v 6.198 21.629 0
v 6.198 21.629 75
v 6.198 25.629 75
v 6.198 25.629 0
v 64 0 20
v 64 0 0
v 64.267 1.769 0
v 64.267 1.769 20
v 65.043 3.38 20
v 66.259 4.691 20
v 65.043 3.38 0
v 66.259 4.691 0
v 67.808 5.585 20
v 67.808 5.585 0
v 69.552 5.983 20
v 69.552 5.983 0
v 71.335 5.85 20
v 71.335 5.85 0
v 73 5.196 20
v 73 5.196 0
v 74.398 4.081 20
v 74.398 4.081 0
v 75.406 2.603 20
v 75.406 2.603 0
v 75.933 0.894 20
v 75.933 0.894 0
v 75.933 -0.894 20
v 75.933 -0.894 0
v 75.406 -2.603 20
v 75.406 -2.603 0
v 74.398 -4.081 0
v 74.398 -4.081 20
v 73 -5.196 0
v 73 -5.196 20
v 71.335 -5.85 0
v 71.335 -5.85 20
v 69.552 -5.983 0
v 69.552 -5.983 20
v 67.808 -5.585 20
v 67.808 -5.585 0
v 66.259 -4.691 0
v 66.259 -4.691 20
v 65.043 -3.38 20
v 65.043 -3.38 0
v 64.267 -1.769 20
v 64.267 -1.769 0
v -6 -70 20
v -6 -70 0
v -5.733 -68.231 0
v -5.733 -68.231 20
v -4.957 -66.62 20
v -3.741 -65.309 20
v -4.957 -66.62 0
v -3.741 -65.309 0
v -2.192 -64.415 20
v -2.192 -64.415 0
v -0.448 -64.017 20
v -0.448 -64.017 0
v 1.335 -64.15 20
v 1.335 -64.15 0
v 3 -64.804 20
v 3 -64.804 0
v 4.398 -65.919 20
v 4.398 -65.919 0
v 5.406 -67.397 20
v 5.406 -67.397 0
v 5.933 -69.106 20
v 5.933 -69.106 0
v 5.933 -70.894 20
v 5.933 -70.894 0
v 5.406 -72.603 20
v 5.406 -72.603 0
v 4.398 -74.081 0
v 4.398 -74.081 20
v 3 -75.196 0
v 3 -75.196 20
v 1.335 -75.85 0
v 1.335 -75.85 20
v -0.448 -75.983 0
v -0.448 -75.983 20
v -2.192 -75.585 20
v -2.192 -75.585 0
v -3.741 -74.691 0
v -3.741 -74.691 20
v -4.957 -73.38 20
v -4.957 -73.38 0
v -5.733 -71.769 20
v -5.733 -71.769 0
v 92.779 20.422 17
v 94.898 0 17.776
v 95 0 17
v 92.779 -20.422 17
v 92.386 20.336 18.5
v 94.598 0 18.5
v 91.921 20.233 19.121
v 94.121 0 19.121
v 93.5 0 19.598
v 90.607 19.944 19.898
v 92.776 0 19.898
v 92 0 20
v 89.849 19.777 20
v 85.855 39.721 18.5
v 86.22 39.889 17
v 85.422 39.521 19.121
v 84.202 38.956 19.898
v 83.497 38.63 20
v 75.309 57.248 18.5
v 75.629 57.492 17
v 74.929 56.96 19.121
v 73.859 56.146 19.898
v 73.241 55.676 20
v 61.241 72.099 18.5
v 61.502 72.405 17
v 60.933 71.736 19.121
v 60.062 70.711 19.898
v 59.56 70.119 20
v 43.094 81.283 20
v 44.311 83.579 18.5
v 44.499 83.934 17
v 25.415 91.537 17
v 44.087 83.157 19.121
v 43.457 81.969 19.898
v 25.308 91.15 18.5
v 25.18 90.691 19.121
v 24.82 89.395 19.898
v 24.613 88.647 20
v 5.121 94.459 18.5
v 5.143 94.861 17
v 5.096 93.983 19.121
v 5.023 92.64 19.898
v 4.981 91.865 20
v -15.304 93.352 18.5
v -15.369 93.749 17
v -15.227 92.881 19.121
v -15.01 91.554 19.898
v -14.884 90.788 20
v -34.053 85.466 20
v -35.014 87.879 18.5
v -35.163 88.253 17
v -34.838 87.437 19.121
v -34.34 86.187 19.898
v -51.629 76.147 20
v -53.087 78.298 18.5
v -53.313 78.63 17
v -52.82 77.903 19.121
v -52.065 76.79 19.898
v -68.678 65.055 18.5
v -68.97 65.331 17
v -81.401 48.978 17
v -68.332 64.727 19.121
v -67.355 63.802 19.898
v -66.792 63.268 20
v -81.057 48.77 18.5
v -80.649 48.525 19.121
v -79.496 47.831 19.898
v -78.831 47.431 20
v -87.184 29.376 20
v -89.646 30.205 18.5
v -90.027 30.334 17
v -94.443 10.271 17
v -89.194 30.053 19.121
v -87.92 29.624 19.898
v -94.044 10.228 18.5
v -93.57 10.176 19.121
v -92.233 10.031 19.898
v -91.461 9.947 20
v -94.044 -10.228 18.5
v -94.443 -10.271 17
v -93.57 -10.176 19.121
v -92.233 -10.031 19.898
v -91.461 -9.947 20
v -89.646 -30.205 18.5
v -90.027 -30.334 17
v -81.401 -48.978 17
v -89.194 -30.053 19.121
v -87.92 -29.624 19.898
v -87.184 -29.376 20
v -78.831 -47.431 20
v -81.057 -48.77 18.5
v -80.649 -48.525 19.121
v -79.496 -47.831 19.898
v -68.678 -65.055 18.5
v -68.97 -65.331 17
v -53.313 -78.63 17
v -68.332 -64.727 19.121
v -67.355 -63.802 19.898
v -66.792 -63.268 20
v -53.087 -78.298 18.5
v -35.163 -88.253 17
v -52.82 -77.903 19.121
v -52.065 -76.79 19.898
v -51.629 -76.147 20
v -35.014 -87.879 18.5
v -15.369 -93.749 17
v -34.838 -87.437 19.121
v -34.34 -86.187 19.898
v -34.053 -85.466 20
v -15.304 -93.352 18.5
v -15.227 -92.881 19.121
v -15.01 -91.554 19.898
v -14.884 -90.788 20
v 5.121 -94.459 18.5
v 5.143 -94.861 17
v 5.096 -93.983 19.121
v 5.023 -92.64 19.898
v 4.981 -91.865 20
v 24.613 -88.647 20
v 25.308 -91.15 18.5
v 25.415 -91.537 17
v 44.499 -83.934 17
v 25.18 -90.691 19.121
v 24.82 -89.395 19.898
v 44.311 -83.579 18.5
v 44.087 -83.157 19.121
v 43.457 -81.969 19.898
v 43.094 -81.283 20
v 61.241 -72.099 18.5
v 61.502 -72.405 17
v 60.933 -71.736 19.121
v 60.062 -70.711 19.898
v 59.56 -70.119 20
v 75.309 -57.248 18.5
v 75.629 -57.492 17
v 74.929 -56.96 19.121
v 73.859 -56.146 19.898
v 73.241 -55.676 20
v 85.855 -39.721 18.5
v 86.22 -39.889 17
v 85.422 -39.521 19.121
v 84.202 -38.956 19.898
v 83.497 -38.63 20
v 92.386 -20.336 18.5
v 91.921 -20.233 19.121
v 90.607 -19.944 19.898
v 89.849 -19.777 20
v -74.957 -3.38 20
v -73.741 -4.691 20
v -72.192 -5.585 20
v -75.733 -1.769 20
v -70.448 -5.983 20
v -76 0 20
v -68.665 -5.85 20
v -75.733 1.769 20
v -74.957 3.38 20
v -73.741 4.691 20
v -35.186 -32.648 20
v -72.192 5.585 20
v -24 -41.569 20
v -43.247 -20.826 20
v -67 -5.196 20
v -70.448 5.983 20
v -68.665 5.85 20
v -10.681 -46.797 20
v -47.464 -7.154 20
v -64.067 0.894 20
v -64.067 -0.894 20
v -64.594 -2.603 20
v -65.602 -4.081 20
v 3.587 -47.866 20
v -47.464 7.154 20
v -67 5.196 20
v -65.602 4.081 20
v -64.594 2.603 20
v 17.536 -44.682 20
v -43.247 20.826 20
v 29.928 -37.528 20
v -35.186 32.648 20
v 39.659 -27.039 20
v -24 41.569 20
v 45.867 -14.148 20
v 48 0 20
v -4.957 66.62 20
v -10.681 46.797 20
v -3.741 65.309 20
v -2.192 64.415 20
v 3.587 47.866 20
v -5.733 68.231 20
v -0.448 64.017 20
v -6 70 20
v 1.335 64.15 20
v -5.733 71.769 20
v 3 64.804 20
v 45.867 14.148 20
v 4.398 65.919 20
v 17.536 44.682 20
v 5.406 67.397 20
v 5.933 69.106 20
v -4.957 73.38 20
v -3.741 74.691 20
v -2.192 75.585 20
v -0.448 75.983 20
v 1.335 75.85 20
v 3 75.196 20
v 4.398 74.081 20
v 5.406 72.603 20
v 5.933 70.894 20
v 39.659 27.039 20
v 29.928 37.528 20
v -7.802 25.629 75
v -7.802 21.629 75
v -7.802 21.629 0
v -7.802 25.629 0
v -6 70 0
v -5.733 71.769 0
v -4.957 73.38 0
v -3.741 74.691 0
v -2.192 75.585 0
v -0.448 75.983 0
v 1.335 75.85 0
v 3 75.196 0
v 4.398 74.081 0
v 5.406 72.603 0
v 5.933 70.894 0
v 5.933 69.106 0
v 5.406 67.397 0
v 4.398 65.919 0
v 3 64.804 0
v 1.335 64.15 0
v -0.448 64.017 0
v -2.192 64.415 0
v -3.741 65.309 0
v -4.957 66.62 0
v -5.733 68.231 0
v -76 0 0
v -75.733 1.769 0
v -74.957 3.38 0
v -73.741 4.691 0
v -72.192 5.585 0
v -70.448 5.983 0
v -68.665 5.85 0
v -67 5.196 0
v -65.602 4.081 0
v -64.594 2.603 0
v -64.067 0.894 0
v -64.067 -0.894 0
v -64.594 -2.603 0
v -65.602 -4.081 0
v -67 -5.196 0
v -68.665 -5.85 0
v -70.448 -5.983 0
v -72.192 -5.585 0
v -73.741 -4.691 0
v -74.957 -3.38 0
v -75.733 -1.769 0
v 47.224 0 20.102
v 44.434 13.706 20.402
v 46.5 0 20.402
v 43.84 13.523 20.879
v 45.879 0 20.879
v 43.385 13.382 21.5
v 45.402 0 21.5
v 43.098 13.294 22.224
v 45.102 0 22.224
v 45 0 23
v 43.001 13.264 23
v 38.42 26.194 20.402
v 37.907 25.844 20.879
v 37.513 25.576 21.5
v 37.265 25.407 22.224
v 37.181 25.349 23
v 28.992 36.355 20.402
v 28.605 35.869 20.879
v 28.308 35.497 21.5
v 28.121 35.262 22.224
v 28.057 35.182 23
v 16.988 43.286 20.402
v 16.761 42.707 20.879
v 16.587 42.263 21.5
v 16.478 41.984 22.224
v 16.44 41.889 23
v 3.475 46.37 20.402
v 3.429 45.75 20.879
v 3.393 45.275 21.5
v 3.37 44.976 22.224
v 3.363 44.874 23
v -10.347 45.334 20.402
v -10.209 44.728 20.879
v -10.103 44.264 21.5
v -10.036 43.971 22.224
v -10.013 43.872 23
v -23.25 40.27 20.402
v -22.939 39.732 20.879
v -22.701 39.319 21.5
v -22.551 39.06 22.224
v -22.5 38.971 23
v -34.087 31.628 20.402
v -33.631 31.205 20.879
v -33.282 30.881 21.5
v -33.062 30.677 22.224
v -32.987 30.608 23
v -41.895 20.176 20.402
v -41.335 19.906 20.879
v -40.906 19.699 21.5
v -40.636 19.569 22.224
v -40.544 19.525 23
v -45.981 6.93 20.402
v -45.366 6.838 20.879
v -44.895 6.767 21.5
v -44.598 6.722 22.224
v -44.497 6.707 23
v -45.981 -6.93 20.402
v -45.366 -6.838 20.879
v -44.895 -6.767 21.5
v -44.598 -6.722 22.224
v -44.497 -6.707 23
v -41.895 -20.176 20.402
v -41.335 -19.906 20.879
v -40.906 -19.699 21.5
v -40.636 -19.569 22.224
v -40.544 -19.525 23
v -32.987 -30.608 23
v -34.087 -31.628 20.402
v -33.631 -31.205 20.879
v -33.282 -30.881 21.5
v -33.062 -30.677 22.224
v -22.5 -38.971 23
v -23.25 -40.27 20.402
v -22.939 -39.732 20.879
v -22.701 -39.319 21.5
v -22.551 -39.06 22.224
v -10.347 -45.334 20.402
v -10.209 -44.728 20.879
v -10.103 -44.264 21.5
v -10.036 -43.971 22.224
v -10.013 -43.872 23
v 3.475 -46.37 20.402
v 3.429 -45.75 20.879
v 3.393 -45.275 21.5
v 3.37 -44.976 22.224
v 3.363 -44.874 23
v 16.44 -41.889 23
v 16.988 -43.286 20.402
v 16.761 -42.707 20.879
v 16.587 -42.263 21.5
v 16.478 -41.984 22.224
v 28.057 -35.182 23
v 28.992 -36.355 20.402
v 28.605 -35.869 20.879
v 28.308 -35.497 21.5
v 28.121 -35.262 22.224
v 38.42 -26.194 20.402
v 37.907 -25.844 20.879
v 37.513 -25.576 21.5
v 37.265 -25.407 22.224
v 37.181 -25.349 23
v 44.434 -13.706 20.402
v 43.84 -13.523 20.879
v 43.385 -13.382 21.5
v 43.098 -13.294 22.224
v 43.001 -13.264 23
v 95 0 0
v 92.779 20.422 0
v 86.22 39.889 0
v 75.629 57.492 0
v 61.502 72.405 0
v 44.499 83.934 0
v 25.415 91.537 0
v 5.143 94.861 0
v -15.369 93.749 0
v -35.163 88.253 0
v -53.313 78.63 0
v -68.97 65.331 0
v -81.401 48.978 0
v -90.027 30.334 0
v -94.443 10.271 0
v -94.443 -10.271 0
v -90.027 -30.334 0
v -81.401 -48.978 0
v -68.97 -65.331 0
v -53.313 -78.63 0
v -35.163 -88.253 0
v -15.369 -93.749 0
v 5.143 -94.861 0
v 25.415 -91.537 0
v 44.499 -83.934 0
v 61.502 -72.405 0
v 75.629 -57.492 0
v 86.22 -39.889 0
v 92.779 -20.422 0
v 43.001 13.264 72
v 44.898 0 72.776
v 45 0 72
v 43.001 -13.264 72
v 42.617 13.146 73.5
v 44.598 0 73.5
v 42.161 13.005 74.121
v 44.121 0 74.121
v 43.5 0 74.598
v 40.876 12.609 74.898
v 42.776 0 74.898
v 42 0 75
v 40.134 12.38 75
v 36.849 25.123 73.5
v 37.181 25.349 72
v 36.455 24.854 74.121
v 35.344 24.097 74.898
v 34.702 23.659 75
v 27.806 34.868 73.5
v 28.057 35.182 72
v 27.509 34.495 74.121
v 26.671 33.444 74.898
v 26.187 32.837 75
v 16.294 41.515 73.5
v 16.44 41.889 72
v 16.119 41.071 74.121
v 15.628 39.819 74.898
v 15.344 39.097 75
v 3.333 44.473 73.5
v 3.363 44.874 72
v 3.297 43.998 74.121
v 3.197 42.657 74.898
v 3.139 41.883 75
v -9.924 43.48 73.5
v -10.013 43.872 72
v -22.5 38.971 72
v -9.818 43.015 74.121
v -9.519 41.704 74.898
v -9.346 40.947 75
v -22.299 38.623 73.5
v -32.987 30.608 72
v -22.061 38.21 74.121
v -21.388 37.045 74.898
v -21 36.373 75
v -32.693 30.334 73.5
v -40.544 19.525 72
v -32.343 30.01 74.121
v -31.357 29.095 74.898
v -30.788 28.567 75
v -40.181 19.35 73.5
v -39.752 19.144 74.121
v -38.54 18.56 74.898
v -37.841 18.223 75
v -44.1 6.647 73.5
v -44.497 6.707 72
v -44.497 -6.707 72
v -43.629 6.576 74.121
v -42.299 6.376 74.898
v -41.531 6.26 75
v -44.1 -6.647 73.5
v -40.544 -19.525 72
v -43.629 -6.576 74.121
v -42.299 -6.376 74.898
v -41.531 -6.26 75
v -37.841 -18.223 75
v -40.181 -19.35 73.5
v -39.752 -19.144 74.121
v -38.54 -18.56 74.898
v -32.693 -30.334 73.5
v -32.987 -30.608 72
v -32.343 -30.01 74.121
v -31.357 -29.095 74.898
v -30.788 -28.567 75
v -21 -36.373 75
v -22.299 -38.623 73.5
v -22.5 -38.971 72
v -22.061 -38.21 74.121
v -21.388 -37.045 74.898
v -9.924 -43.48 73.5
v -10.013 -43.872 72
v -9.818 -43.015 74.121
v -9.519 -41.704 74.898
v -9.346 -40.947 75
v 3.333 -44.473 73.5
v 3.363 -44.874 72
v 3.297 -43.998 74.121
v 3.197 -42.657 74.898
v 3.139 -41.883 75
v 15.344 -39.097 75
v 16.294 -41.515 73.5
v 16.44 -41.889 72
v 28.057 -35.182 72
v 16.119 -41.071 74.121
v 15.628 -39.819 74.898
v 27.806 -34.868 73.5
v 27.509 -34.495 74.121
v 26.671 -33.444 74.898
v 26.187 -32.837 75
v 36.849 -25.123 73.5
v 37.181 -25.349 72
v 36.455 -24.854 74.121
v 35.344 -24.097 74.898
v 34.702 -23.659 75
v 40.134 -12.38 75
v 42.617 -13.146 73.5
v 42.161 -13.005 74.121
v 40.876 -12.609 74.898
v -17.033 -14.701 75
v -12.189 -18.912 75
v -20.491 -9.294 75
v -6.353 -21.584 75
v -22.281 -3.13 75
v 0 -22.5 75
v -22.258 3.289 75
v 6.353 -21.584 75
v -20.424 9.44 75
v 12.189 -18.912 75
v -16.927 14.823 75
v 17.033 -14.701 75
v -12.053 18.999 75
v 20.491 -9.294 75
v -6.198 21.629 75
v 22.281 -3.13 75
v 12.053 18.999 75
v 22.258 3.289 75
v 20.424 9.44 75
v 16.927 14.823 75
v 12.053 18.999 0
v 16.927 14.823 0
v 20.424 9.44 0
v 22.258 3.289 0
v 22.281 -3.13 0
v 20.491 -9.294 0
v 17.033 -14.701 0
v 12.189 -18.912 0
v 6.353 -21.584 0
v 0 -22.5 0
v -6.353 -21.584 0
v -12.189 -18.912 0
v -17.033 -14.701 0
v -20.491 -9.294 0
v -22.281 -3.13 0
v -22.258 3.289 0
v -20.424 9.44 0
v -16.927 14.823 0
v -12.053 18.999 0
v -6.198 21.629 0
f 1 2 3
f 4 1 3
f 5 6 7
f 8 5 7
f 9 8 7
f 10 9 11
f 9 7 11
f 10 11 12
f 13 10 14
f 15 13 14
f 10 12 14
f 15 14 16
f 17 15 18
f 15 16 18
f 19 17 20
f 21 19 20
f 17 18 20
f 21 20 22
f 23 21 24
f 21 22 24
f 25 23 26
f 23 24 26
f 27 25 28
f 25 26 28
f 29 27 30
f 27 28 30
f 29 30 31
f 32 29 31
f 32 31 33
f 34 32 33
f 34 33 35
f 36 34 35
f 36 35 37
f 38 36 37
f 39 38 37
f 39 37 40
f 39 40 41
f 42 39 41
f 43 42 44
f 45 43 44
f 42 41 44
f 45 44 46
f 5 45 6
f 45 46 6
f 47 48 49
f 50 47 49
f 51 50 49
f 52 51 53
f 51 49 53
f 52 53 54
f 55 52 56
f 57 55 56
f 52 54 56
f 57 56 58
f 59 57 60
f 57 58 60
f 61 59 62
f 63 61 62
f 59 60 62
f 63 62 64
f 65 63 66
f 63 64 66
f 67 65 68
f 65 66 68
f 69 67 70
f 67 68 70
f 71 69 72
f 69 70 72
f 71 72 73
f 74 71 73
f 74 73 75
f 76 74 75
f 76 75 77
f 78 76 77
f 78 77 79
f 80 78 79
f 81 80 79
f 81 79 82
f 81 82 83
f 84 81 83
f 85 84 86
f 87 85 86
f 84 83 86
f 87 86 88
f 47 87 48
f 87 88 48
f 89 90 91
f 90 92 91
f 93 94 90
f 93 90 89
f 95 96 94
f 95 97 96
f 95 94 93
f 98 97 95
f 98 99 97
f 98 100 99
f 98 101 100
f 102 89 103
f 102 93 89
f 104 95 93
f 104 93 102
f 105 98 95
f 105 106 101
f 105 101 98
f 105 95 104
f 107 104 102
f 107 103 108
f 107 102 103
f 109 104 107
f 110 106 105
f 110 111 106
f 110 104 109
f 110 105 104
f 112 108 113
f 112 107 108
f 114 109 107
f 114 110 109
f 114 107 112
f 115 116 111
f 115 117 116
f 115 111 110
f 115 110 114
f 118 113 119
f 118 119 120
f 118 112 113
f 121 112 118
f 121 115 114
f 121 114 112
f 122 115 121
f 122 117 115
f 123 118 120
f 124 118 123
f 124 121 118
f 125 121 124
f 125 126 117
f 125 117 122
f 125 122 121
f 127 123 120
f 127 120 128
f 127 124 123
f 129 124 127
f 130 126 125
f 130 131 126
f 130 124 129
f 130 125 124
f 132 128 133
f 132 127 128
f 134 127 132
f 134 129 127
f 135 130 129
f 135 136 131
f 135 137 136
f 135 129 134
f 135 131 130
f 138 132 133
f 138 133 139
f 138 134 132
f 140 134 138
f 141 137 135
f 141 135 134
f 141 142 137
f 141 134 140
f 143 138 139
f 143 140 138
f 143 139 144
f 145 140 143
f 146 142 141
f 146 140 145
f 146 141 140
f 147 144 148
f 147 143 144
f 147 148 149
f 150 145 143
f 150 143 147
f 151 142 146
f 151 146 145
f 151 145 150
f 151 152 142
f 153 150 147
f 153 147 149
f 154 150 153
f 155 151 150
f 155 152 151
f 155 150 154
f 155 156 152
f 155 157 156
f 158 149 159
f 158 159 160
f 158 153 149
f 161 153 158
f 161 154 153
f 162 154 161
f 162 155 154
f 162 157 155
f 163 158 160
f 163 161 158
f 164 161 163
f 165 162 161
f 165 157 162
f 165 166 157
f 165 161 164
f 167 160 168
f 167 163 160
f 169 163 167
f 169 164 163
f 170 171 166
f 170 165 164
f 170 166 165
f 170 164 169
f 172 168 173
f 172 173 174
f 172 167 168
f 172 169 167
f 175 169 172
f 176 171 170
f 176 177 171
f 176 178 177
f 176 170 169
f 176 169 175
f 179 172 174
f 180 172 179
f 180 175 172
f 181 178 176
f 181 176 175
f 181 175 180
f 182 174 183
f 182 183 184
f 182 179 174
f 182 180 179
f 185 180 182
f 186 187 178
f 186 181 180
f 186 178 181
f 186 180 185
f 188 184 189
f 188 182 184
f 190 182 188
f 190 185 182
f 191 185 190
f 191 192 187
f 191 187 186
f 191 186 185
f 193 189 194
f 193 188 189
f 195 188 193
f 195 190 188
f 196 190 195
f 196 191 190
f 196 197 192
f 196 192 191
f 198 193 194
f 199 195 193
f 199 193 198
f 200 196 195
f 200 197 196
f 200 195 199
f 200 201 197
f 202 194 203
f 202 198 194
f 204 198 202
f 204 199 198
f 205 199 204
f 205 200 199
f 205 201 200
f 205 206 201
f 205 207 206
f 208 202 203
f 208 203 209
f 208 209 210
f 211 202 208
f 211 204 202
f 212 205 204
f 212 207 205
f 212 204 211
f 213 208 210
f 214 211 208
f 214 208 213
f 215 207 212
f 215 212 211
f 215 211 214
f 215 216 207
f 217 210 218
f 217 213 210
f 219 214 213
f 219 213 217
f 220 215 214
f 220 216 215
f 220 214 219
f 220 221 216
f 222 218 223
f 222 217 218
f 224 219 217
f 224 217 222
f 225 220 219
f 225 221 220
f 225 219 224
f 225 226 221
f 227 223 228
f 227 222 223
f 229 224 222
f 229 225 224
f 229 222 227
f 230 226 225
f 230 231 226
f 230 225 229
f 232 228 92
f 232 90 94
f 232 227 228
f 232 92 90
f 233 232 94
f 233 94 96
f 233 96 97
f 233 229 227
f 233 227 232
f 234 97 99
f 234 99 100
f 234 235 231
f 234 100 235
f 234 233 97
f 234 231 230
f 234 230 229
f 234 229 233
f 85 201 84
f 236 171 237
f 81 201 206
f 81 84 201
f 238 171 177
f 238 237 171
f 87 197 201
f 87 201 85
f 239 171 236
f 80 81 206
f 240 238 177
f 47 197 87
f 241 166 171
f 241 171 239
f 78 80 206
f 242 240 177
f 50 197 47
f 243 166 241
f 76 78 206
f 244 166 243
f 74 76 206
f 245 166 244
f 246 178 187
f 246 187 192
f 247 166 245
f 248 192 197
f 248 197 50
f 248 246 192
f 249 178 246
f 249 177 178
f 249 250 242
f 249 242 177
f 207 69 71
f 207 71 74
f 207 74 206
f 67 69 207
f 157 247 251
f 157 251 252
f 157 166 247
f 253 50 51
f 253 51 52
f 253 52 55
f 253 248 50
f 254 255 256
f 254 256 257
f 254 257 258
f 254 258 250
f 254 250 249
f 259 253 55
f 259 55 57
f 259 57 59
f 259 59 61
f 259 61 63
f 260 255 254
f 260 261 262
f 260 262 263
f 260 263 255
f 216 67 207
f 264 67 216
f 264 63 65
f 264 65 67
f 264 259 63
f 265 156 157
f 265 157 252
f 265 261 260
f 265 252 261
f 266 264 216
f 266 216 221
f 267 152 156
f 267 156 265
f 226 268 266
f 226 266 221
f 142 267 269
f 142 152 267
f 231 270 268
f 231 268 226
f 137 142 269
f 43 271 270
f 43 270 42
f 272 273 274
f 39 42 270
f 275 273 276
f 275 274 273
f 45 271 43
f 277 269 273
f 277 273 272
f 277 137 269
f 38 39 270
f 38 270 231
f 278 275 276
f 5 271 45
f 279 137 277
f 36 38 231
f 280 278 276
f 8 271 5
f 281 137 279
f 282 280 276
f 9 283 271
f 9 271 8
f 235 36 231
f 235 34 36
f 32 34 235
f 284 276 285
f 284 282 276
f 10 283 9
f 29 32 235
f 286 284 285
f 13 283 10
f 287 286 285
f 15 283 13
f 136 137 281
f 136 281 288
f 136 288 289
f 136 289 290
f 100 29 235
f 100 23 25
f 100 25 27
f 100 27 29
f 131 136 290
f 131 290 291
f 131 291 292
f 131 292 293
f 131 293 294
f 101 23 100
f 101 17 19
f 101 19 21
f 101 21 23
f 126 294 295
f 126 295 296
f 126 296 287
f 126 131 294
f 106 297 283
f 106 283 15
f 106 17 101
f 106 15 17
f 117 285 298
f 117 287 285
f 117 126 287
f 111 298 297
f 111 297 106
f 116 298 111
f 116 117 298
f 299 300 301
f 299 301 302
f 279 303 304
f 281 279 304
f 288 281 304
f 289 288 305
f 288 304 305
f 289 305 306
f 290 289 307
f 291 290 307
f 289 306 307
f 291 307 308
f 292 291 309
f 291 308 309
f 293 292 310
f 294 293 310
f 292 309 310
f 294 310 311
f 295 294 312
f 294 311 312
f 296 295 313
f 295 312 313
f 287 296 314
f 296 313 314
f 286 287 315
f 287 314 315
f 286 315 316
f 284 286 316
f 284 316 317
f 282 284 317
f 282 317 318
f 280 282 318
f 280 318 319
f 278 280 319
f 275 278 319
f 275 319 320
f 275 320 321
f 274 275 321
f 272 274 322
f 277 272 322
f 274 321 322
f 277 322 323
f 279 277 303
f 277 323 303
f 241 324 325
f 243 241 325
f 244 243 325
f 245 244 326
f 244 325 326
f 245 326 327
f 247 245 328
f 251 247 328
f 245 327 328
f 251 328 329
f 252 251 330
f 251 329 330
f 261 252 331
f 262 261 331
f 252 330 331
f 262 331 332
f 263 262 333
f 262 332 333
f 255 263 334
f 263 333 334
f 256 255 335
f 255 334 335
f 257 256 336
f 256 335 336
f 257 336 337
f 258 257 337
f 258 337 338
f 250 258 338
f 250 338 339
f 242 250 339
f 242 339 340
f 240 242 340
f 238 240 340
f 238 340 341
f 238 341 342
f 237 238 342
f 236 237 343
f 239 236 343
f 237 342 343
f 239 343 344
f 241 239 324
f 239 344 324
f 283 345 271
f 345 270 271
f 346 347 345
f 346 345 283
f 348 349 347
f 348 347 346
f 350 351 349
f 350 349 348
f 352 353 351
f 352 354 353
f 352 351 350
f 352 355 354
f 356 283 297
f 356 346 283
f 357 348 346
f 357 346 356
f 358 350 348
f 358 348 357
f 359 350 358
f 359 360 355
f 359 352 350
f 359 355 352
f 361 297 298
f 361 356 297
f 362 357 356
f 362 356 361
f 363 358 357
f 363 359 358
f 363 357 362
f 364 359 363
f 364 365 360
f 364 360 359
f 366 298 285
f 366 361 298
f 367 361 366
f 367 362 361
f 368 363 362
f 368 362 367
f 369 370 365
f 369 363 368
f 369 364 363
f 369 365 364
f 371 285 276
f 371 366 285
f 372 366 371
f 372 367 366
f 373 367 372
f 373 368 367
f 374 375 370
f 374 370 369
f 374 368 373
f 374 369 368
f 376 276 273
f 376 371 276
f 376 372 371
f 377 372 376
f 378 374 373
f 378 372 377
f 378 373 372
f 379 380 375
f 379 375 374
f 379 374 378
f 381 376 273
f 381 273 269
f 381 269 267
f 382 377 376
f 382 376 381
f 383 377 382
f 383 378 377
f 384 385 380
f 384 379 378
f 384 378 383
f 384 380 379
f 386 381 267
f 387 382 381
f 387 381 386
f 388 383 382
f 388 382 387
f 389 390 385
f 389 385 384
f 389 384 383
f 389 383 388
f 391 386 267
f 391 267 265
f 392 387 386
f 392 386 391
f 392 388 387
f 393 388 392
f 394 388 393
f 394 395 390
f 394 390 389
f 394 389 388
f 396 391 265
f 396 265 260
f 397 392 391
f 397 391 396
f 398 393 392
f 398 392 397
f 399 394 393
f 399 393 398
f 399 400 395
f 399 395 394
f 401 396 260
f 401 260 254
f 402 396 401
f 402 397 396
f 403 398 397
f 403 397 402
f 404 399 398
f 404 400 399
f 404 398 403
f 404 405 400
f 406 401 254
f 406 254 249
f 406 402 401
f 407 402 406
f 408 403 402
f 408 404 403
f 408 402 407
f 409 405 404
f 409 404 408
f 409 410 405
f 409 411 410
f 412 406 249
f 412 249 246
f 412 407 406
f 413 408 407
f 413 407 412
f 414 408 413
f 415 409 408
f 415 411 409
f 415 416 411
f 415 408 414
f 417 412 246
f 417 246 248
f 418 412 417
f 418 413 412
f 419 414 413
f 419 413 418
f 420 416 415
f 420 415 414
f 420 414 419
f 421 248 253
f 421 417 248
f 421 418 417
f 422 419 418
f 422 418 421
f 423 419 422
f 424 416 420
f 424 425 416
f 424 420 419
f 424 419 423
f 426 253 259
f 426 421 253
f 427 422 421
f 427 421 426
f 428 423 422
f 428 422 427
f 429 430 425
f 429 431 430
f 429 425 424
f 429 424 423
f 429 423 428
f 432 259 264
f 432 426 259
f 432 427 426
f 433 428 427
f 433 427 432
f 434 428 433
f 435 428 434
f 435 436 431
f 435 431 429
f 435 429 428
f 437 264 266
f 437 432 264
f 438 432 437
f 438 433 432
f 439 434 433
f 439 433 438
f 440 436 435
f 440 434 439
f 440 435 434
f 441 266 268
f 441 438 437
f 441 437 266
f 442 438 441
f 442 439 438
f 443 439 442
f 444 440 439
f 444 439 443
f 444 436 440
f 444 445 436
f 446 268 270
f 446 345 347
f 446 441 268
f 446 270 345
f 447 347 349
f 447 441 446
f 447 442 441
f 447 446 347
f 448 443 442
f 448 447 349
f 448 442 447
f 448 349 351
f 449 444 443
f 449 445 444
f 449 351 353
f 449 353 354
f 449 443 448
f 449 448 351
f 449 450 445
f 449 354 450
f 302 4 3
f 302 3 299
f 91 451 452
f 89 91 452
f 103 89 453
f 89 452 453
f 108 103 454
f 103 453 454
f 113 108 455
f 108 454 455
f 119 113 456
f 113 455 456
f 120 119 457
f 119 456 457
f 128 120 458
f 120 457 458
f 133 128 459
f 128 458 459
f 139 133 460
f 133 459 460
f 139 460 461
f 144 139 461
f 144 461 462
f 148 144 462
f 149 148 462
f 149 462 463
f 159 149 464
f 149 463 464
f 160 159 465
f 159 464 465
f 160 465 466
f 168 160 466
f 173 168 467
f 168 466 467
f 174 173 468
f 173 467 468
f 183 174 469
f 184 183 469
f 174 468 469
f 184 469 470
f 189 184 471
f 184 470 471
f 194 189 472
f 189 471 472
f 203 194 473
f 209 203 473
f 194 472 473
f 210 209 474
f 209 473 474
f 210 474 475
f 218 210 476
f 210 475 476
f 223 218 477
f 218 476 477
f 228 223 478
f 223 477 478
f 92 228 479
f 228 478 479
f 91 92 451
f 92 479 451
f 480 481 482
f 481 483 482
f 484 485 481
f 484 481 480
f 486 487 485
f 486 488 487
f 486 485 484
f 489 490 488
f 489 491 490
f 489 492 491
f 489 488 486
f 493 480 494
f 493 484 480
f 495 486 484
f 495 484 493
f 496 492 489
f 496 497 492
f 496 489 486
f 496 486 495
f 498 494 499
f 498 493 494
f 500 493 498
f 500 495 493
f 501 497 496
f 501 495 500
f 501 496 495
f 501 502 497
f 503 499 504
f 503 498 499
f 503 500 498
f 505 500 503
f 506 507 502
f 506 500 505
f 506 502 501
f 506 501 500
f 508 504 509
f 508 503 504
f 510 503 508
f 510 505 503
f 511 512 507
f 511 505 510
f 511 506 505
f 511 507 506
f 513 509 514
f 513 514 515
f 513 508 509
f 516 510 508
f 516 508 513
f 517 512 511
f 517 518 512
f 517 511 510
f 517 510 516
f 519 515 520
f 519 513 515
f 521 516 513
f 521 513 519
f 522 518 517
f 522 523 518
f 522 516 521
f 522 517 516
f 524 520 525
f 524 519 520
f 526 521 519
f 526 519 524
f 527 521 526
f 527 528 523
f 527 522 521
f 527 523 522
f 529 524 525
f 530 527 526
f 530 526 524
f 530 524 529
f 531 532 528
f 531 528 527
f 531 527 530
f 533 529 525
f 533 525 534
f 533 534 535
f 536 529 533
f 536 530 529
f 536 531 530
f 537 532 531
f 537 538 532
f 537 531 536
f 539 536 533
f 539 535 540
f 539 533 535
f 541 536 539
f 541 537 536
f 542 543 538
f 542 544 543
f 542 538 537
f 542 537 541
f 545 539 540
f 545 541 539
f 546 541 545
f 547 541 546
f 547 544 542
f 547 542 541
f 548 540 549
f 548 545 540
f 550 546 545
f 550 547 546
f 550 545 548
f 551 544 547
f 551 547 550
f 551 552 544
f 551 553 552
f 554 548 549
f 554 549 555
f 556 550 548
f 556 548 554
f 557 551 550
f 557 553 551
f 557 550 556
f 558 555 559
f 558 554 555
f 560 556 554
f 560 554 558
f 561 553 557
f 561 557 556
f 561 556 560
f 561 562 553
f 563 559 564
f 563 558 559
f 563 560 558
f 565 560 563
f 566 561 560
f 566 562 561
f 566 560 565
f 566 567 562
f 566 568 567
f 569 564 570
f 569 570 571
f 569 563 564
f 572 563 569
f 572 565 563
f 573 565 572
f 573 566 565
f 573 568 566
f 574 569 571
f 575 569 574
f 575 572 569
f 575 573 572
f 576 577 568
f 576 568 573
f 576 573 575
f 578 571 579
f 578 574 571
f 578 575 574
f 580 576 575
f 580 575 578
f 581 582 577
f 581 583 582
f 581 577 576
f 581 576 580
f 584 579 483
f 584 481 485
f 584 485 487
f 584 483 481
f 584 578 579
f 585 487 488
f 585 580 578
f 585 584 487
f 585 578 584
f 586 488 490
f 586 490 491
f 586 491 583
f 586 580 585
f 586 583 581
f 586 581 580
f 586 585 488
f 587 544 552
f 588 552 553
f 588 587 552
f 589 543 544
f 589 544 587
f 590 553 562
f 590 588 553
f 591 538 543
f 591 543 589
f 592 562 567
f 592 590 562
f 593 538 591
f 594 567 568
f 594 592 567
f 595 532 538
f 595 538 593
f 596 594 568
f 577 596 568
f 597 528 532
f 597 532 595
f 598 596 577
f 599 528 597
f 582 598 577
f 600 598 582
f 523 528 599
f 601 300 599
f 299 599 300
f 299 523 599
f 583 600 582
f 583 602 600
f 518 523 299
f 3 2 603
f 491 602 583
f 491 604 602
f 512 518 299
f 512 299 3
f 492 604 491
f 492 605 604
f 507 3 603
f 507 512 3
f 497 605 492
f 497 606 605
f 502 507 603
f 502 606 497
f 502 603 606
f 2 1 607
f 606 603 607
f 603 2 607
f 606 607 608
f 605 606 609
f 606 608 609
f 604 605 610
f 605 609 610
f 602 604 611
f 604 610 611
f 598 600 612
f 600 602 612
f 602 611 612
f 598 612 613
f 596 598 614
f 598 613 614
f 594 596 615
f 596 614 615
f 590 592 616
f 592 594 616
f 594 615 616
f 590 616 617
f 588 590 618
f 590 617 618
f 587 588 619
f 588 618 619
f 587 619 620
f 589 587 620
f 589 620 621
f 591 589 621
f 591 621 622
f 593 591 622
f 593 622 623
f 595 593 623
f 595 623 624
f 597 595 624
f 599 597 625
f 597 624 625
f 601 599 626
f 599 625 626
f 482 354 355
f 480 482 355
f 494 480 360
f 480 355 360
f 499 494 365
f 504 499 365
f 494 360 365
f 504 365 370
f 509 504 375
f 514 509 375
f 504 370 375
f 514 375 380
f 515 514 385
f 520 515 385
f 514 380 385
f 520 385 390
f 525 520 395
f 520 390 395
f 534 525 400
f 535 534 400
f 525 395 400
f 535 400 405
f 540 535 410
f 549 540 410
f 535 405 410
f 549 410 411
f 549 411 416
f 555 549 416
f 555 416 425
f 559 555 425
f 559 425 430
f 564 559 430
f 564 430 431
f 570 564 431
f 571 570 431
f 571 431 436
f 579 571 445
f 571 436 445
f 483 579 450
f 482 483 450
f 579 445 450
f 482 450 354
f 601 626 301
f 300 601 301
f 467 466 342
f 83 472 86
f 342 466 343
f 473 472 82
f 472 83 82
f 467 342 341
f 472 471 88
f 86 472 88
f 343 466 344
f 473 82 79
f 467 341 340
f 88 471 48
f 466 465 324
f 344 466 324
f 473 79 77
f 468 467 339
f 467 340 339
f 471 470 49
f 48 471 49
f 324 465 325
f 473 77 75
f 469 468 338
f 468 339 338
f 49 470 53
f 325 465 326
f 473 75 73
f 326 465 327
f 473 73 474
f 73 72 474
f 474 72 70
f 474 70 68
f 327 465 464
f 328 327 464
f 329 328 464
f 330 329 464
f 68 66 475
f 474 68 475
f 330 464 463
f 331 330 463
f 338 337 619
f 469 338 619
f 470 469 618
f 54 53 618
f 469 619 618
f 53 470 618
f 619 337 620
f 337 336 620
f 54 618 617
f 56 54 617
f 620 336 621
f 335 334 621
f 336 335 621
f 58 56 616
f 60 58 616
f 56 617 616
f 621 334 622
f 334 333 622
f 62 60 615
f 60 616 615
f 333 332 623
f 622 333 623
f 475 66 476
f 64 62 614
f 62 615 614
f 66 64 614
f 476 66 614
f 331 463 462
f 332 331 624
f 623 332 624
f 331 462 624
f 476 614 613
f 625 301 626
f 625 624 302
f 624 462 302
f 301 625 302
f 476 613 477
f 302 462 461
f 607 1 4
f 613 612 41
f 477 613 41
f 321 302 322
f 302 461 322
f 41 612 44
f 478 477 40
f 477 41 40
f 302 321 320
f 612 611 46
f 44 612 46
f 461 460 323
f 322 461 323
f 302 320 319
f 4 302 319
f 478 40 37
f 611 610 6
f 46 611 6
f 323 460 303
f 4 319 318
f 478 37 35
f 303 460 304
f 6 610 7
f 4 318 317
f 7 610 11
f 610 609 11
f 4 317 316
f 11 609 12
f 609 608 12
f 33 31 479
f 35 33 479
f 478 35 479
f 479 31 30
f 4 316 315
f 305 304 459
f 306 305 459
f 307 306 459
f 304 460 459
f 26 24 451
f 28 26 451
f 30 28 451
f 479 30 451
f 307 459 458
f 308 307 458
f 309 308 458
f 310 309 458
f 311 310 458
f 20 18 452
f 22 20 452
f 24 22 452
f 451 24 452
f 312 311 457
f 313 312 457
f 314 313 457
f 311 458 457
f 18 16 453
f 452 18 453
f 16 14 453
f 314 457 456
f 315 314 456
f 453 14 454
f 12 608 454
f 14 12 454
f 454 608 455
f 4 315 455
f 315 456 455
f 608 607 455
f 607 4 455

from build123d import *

# Parameters (mm, degrees)
SKETCH2_R           = 95
BOSS_EXTRUDE1_DEPTH = 20
SKETCH3_R           = 45
BOSS_EXTRUDE2_DEPTH = 55
SKETCH4_R           = 22.5
CUT_EXTRUDE1_DEPTH  = 75
SKETCH5_R           = 6
CUT_EXTRUDE2_DEPTH  = 20
SKETCH6_W           = 14
SKETCH6_H           = 4
CUT_EXTRUDE3_DEPTH  = 75
FILLET1_R           = 3


with BuildPart() as part:
    # Sketch2 → Boss-Extrude1 (new body)
    with BuildSketch(Plane.XY):
        Circle(SKETCH2_R)
    extrude(amount=BOSS_EXTRUDE1_DEPTH)

    # Sketch3 → Boss-Extrude2 (add)
    with BuildSketch(Plane.XY.offset(20)):
        Circle(SKETCH3_R)
    extrude(amount=BOSS_EXTRUDE2_DEPTH)

    # Sketch4 → Cut-Extrude1 (cut)
    with BuildSketch(Plane(origin=(0, 0, 0), x_dir=(-1, 0, 0), z_dir=(0, 0, -1))):
        Circle(SKETCH4_R)
    extrude(amount=-CUT_EXTRUDE1_DEPTH, mode=Mode.SUBTRACT)

    # Sketch5 → Cut-Extrude2 (cut)
    with BuildSketch(Plane(origin=(0, 0, 0), x_dir=(-1, 0, 0), z_dir=(0, 0, -1))):
        with Locations((0, 70)):
            Circle(SKETCH5_R)
        with Locations((70, 0)):
            Circle(SKETCH5_R)
        with Locations((0, -70)):
            Circle(SKETCH5_R)
        with Locations((-70, 0)):
            Circle(SKETCH5_R)
    extrude(amount=-CUT_EXTRUDE2_DEPTH, mode=Mode.SUBTRACT)

    # Sketch6 → Cut-Extrude3 (cut)
    with BuildSketch(Plane(origin=(0, 0, 0), x_dir=(-1, 0, 0), z_dir=(0, 0, -1))):
        with Locations((0.80166167, 23.629392085)):
            Rectangle(SKETCH6_W, SKETCH6_H)
    extrude(amount=-CUT_EXTRUDE3_DEPTH, mode=Mode.SUBTRACT)

    # Fillet1
    fillet1_edges = [part.edges().sort_by_distance(p)[0] for p in [
        (-95, 0, 20),
        (-45, 0, 20),
        (-45, 0, 75),
    ]]
    fillet(fillet1_edges, radius=FILLET1_R)


solid = part.part
